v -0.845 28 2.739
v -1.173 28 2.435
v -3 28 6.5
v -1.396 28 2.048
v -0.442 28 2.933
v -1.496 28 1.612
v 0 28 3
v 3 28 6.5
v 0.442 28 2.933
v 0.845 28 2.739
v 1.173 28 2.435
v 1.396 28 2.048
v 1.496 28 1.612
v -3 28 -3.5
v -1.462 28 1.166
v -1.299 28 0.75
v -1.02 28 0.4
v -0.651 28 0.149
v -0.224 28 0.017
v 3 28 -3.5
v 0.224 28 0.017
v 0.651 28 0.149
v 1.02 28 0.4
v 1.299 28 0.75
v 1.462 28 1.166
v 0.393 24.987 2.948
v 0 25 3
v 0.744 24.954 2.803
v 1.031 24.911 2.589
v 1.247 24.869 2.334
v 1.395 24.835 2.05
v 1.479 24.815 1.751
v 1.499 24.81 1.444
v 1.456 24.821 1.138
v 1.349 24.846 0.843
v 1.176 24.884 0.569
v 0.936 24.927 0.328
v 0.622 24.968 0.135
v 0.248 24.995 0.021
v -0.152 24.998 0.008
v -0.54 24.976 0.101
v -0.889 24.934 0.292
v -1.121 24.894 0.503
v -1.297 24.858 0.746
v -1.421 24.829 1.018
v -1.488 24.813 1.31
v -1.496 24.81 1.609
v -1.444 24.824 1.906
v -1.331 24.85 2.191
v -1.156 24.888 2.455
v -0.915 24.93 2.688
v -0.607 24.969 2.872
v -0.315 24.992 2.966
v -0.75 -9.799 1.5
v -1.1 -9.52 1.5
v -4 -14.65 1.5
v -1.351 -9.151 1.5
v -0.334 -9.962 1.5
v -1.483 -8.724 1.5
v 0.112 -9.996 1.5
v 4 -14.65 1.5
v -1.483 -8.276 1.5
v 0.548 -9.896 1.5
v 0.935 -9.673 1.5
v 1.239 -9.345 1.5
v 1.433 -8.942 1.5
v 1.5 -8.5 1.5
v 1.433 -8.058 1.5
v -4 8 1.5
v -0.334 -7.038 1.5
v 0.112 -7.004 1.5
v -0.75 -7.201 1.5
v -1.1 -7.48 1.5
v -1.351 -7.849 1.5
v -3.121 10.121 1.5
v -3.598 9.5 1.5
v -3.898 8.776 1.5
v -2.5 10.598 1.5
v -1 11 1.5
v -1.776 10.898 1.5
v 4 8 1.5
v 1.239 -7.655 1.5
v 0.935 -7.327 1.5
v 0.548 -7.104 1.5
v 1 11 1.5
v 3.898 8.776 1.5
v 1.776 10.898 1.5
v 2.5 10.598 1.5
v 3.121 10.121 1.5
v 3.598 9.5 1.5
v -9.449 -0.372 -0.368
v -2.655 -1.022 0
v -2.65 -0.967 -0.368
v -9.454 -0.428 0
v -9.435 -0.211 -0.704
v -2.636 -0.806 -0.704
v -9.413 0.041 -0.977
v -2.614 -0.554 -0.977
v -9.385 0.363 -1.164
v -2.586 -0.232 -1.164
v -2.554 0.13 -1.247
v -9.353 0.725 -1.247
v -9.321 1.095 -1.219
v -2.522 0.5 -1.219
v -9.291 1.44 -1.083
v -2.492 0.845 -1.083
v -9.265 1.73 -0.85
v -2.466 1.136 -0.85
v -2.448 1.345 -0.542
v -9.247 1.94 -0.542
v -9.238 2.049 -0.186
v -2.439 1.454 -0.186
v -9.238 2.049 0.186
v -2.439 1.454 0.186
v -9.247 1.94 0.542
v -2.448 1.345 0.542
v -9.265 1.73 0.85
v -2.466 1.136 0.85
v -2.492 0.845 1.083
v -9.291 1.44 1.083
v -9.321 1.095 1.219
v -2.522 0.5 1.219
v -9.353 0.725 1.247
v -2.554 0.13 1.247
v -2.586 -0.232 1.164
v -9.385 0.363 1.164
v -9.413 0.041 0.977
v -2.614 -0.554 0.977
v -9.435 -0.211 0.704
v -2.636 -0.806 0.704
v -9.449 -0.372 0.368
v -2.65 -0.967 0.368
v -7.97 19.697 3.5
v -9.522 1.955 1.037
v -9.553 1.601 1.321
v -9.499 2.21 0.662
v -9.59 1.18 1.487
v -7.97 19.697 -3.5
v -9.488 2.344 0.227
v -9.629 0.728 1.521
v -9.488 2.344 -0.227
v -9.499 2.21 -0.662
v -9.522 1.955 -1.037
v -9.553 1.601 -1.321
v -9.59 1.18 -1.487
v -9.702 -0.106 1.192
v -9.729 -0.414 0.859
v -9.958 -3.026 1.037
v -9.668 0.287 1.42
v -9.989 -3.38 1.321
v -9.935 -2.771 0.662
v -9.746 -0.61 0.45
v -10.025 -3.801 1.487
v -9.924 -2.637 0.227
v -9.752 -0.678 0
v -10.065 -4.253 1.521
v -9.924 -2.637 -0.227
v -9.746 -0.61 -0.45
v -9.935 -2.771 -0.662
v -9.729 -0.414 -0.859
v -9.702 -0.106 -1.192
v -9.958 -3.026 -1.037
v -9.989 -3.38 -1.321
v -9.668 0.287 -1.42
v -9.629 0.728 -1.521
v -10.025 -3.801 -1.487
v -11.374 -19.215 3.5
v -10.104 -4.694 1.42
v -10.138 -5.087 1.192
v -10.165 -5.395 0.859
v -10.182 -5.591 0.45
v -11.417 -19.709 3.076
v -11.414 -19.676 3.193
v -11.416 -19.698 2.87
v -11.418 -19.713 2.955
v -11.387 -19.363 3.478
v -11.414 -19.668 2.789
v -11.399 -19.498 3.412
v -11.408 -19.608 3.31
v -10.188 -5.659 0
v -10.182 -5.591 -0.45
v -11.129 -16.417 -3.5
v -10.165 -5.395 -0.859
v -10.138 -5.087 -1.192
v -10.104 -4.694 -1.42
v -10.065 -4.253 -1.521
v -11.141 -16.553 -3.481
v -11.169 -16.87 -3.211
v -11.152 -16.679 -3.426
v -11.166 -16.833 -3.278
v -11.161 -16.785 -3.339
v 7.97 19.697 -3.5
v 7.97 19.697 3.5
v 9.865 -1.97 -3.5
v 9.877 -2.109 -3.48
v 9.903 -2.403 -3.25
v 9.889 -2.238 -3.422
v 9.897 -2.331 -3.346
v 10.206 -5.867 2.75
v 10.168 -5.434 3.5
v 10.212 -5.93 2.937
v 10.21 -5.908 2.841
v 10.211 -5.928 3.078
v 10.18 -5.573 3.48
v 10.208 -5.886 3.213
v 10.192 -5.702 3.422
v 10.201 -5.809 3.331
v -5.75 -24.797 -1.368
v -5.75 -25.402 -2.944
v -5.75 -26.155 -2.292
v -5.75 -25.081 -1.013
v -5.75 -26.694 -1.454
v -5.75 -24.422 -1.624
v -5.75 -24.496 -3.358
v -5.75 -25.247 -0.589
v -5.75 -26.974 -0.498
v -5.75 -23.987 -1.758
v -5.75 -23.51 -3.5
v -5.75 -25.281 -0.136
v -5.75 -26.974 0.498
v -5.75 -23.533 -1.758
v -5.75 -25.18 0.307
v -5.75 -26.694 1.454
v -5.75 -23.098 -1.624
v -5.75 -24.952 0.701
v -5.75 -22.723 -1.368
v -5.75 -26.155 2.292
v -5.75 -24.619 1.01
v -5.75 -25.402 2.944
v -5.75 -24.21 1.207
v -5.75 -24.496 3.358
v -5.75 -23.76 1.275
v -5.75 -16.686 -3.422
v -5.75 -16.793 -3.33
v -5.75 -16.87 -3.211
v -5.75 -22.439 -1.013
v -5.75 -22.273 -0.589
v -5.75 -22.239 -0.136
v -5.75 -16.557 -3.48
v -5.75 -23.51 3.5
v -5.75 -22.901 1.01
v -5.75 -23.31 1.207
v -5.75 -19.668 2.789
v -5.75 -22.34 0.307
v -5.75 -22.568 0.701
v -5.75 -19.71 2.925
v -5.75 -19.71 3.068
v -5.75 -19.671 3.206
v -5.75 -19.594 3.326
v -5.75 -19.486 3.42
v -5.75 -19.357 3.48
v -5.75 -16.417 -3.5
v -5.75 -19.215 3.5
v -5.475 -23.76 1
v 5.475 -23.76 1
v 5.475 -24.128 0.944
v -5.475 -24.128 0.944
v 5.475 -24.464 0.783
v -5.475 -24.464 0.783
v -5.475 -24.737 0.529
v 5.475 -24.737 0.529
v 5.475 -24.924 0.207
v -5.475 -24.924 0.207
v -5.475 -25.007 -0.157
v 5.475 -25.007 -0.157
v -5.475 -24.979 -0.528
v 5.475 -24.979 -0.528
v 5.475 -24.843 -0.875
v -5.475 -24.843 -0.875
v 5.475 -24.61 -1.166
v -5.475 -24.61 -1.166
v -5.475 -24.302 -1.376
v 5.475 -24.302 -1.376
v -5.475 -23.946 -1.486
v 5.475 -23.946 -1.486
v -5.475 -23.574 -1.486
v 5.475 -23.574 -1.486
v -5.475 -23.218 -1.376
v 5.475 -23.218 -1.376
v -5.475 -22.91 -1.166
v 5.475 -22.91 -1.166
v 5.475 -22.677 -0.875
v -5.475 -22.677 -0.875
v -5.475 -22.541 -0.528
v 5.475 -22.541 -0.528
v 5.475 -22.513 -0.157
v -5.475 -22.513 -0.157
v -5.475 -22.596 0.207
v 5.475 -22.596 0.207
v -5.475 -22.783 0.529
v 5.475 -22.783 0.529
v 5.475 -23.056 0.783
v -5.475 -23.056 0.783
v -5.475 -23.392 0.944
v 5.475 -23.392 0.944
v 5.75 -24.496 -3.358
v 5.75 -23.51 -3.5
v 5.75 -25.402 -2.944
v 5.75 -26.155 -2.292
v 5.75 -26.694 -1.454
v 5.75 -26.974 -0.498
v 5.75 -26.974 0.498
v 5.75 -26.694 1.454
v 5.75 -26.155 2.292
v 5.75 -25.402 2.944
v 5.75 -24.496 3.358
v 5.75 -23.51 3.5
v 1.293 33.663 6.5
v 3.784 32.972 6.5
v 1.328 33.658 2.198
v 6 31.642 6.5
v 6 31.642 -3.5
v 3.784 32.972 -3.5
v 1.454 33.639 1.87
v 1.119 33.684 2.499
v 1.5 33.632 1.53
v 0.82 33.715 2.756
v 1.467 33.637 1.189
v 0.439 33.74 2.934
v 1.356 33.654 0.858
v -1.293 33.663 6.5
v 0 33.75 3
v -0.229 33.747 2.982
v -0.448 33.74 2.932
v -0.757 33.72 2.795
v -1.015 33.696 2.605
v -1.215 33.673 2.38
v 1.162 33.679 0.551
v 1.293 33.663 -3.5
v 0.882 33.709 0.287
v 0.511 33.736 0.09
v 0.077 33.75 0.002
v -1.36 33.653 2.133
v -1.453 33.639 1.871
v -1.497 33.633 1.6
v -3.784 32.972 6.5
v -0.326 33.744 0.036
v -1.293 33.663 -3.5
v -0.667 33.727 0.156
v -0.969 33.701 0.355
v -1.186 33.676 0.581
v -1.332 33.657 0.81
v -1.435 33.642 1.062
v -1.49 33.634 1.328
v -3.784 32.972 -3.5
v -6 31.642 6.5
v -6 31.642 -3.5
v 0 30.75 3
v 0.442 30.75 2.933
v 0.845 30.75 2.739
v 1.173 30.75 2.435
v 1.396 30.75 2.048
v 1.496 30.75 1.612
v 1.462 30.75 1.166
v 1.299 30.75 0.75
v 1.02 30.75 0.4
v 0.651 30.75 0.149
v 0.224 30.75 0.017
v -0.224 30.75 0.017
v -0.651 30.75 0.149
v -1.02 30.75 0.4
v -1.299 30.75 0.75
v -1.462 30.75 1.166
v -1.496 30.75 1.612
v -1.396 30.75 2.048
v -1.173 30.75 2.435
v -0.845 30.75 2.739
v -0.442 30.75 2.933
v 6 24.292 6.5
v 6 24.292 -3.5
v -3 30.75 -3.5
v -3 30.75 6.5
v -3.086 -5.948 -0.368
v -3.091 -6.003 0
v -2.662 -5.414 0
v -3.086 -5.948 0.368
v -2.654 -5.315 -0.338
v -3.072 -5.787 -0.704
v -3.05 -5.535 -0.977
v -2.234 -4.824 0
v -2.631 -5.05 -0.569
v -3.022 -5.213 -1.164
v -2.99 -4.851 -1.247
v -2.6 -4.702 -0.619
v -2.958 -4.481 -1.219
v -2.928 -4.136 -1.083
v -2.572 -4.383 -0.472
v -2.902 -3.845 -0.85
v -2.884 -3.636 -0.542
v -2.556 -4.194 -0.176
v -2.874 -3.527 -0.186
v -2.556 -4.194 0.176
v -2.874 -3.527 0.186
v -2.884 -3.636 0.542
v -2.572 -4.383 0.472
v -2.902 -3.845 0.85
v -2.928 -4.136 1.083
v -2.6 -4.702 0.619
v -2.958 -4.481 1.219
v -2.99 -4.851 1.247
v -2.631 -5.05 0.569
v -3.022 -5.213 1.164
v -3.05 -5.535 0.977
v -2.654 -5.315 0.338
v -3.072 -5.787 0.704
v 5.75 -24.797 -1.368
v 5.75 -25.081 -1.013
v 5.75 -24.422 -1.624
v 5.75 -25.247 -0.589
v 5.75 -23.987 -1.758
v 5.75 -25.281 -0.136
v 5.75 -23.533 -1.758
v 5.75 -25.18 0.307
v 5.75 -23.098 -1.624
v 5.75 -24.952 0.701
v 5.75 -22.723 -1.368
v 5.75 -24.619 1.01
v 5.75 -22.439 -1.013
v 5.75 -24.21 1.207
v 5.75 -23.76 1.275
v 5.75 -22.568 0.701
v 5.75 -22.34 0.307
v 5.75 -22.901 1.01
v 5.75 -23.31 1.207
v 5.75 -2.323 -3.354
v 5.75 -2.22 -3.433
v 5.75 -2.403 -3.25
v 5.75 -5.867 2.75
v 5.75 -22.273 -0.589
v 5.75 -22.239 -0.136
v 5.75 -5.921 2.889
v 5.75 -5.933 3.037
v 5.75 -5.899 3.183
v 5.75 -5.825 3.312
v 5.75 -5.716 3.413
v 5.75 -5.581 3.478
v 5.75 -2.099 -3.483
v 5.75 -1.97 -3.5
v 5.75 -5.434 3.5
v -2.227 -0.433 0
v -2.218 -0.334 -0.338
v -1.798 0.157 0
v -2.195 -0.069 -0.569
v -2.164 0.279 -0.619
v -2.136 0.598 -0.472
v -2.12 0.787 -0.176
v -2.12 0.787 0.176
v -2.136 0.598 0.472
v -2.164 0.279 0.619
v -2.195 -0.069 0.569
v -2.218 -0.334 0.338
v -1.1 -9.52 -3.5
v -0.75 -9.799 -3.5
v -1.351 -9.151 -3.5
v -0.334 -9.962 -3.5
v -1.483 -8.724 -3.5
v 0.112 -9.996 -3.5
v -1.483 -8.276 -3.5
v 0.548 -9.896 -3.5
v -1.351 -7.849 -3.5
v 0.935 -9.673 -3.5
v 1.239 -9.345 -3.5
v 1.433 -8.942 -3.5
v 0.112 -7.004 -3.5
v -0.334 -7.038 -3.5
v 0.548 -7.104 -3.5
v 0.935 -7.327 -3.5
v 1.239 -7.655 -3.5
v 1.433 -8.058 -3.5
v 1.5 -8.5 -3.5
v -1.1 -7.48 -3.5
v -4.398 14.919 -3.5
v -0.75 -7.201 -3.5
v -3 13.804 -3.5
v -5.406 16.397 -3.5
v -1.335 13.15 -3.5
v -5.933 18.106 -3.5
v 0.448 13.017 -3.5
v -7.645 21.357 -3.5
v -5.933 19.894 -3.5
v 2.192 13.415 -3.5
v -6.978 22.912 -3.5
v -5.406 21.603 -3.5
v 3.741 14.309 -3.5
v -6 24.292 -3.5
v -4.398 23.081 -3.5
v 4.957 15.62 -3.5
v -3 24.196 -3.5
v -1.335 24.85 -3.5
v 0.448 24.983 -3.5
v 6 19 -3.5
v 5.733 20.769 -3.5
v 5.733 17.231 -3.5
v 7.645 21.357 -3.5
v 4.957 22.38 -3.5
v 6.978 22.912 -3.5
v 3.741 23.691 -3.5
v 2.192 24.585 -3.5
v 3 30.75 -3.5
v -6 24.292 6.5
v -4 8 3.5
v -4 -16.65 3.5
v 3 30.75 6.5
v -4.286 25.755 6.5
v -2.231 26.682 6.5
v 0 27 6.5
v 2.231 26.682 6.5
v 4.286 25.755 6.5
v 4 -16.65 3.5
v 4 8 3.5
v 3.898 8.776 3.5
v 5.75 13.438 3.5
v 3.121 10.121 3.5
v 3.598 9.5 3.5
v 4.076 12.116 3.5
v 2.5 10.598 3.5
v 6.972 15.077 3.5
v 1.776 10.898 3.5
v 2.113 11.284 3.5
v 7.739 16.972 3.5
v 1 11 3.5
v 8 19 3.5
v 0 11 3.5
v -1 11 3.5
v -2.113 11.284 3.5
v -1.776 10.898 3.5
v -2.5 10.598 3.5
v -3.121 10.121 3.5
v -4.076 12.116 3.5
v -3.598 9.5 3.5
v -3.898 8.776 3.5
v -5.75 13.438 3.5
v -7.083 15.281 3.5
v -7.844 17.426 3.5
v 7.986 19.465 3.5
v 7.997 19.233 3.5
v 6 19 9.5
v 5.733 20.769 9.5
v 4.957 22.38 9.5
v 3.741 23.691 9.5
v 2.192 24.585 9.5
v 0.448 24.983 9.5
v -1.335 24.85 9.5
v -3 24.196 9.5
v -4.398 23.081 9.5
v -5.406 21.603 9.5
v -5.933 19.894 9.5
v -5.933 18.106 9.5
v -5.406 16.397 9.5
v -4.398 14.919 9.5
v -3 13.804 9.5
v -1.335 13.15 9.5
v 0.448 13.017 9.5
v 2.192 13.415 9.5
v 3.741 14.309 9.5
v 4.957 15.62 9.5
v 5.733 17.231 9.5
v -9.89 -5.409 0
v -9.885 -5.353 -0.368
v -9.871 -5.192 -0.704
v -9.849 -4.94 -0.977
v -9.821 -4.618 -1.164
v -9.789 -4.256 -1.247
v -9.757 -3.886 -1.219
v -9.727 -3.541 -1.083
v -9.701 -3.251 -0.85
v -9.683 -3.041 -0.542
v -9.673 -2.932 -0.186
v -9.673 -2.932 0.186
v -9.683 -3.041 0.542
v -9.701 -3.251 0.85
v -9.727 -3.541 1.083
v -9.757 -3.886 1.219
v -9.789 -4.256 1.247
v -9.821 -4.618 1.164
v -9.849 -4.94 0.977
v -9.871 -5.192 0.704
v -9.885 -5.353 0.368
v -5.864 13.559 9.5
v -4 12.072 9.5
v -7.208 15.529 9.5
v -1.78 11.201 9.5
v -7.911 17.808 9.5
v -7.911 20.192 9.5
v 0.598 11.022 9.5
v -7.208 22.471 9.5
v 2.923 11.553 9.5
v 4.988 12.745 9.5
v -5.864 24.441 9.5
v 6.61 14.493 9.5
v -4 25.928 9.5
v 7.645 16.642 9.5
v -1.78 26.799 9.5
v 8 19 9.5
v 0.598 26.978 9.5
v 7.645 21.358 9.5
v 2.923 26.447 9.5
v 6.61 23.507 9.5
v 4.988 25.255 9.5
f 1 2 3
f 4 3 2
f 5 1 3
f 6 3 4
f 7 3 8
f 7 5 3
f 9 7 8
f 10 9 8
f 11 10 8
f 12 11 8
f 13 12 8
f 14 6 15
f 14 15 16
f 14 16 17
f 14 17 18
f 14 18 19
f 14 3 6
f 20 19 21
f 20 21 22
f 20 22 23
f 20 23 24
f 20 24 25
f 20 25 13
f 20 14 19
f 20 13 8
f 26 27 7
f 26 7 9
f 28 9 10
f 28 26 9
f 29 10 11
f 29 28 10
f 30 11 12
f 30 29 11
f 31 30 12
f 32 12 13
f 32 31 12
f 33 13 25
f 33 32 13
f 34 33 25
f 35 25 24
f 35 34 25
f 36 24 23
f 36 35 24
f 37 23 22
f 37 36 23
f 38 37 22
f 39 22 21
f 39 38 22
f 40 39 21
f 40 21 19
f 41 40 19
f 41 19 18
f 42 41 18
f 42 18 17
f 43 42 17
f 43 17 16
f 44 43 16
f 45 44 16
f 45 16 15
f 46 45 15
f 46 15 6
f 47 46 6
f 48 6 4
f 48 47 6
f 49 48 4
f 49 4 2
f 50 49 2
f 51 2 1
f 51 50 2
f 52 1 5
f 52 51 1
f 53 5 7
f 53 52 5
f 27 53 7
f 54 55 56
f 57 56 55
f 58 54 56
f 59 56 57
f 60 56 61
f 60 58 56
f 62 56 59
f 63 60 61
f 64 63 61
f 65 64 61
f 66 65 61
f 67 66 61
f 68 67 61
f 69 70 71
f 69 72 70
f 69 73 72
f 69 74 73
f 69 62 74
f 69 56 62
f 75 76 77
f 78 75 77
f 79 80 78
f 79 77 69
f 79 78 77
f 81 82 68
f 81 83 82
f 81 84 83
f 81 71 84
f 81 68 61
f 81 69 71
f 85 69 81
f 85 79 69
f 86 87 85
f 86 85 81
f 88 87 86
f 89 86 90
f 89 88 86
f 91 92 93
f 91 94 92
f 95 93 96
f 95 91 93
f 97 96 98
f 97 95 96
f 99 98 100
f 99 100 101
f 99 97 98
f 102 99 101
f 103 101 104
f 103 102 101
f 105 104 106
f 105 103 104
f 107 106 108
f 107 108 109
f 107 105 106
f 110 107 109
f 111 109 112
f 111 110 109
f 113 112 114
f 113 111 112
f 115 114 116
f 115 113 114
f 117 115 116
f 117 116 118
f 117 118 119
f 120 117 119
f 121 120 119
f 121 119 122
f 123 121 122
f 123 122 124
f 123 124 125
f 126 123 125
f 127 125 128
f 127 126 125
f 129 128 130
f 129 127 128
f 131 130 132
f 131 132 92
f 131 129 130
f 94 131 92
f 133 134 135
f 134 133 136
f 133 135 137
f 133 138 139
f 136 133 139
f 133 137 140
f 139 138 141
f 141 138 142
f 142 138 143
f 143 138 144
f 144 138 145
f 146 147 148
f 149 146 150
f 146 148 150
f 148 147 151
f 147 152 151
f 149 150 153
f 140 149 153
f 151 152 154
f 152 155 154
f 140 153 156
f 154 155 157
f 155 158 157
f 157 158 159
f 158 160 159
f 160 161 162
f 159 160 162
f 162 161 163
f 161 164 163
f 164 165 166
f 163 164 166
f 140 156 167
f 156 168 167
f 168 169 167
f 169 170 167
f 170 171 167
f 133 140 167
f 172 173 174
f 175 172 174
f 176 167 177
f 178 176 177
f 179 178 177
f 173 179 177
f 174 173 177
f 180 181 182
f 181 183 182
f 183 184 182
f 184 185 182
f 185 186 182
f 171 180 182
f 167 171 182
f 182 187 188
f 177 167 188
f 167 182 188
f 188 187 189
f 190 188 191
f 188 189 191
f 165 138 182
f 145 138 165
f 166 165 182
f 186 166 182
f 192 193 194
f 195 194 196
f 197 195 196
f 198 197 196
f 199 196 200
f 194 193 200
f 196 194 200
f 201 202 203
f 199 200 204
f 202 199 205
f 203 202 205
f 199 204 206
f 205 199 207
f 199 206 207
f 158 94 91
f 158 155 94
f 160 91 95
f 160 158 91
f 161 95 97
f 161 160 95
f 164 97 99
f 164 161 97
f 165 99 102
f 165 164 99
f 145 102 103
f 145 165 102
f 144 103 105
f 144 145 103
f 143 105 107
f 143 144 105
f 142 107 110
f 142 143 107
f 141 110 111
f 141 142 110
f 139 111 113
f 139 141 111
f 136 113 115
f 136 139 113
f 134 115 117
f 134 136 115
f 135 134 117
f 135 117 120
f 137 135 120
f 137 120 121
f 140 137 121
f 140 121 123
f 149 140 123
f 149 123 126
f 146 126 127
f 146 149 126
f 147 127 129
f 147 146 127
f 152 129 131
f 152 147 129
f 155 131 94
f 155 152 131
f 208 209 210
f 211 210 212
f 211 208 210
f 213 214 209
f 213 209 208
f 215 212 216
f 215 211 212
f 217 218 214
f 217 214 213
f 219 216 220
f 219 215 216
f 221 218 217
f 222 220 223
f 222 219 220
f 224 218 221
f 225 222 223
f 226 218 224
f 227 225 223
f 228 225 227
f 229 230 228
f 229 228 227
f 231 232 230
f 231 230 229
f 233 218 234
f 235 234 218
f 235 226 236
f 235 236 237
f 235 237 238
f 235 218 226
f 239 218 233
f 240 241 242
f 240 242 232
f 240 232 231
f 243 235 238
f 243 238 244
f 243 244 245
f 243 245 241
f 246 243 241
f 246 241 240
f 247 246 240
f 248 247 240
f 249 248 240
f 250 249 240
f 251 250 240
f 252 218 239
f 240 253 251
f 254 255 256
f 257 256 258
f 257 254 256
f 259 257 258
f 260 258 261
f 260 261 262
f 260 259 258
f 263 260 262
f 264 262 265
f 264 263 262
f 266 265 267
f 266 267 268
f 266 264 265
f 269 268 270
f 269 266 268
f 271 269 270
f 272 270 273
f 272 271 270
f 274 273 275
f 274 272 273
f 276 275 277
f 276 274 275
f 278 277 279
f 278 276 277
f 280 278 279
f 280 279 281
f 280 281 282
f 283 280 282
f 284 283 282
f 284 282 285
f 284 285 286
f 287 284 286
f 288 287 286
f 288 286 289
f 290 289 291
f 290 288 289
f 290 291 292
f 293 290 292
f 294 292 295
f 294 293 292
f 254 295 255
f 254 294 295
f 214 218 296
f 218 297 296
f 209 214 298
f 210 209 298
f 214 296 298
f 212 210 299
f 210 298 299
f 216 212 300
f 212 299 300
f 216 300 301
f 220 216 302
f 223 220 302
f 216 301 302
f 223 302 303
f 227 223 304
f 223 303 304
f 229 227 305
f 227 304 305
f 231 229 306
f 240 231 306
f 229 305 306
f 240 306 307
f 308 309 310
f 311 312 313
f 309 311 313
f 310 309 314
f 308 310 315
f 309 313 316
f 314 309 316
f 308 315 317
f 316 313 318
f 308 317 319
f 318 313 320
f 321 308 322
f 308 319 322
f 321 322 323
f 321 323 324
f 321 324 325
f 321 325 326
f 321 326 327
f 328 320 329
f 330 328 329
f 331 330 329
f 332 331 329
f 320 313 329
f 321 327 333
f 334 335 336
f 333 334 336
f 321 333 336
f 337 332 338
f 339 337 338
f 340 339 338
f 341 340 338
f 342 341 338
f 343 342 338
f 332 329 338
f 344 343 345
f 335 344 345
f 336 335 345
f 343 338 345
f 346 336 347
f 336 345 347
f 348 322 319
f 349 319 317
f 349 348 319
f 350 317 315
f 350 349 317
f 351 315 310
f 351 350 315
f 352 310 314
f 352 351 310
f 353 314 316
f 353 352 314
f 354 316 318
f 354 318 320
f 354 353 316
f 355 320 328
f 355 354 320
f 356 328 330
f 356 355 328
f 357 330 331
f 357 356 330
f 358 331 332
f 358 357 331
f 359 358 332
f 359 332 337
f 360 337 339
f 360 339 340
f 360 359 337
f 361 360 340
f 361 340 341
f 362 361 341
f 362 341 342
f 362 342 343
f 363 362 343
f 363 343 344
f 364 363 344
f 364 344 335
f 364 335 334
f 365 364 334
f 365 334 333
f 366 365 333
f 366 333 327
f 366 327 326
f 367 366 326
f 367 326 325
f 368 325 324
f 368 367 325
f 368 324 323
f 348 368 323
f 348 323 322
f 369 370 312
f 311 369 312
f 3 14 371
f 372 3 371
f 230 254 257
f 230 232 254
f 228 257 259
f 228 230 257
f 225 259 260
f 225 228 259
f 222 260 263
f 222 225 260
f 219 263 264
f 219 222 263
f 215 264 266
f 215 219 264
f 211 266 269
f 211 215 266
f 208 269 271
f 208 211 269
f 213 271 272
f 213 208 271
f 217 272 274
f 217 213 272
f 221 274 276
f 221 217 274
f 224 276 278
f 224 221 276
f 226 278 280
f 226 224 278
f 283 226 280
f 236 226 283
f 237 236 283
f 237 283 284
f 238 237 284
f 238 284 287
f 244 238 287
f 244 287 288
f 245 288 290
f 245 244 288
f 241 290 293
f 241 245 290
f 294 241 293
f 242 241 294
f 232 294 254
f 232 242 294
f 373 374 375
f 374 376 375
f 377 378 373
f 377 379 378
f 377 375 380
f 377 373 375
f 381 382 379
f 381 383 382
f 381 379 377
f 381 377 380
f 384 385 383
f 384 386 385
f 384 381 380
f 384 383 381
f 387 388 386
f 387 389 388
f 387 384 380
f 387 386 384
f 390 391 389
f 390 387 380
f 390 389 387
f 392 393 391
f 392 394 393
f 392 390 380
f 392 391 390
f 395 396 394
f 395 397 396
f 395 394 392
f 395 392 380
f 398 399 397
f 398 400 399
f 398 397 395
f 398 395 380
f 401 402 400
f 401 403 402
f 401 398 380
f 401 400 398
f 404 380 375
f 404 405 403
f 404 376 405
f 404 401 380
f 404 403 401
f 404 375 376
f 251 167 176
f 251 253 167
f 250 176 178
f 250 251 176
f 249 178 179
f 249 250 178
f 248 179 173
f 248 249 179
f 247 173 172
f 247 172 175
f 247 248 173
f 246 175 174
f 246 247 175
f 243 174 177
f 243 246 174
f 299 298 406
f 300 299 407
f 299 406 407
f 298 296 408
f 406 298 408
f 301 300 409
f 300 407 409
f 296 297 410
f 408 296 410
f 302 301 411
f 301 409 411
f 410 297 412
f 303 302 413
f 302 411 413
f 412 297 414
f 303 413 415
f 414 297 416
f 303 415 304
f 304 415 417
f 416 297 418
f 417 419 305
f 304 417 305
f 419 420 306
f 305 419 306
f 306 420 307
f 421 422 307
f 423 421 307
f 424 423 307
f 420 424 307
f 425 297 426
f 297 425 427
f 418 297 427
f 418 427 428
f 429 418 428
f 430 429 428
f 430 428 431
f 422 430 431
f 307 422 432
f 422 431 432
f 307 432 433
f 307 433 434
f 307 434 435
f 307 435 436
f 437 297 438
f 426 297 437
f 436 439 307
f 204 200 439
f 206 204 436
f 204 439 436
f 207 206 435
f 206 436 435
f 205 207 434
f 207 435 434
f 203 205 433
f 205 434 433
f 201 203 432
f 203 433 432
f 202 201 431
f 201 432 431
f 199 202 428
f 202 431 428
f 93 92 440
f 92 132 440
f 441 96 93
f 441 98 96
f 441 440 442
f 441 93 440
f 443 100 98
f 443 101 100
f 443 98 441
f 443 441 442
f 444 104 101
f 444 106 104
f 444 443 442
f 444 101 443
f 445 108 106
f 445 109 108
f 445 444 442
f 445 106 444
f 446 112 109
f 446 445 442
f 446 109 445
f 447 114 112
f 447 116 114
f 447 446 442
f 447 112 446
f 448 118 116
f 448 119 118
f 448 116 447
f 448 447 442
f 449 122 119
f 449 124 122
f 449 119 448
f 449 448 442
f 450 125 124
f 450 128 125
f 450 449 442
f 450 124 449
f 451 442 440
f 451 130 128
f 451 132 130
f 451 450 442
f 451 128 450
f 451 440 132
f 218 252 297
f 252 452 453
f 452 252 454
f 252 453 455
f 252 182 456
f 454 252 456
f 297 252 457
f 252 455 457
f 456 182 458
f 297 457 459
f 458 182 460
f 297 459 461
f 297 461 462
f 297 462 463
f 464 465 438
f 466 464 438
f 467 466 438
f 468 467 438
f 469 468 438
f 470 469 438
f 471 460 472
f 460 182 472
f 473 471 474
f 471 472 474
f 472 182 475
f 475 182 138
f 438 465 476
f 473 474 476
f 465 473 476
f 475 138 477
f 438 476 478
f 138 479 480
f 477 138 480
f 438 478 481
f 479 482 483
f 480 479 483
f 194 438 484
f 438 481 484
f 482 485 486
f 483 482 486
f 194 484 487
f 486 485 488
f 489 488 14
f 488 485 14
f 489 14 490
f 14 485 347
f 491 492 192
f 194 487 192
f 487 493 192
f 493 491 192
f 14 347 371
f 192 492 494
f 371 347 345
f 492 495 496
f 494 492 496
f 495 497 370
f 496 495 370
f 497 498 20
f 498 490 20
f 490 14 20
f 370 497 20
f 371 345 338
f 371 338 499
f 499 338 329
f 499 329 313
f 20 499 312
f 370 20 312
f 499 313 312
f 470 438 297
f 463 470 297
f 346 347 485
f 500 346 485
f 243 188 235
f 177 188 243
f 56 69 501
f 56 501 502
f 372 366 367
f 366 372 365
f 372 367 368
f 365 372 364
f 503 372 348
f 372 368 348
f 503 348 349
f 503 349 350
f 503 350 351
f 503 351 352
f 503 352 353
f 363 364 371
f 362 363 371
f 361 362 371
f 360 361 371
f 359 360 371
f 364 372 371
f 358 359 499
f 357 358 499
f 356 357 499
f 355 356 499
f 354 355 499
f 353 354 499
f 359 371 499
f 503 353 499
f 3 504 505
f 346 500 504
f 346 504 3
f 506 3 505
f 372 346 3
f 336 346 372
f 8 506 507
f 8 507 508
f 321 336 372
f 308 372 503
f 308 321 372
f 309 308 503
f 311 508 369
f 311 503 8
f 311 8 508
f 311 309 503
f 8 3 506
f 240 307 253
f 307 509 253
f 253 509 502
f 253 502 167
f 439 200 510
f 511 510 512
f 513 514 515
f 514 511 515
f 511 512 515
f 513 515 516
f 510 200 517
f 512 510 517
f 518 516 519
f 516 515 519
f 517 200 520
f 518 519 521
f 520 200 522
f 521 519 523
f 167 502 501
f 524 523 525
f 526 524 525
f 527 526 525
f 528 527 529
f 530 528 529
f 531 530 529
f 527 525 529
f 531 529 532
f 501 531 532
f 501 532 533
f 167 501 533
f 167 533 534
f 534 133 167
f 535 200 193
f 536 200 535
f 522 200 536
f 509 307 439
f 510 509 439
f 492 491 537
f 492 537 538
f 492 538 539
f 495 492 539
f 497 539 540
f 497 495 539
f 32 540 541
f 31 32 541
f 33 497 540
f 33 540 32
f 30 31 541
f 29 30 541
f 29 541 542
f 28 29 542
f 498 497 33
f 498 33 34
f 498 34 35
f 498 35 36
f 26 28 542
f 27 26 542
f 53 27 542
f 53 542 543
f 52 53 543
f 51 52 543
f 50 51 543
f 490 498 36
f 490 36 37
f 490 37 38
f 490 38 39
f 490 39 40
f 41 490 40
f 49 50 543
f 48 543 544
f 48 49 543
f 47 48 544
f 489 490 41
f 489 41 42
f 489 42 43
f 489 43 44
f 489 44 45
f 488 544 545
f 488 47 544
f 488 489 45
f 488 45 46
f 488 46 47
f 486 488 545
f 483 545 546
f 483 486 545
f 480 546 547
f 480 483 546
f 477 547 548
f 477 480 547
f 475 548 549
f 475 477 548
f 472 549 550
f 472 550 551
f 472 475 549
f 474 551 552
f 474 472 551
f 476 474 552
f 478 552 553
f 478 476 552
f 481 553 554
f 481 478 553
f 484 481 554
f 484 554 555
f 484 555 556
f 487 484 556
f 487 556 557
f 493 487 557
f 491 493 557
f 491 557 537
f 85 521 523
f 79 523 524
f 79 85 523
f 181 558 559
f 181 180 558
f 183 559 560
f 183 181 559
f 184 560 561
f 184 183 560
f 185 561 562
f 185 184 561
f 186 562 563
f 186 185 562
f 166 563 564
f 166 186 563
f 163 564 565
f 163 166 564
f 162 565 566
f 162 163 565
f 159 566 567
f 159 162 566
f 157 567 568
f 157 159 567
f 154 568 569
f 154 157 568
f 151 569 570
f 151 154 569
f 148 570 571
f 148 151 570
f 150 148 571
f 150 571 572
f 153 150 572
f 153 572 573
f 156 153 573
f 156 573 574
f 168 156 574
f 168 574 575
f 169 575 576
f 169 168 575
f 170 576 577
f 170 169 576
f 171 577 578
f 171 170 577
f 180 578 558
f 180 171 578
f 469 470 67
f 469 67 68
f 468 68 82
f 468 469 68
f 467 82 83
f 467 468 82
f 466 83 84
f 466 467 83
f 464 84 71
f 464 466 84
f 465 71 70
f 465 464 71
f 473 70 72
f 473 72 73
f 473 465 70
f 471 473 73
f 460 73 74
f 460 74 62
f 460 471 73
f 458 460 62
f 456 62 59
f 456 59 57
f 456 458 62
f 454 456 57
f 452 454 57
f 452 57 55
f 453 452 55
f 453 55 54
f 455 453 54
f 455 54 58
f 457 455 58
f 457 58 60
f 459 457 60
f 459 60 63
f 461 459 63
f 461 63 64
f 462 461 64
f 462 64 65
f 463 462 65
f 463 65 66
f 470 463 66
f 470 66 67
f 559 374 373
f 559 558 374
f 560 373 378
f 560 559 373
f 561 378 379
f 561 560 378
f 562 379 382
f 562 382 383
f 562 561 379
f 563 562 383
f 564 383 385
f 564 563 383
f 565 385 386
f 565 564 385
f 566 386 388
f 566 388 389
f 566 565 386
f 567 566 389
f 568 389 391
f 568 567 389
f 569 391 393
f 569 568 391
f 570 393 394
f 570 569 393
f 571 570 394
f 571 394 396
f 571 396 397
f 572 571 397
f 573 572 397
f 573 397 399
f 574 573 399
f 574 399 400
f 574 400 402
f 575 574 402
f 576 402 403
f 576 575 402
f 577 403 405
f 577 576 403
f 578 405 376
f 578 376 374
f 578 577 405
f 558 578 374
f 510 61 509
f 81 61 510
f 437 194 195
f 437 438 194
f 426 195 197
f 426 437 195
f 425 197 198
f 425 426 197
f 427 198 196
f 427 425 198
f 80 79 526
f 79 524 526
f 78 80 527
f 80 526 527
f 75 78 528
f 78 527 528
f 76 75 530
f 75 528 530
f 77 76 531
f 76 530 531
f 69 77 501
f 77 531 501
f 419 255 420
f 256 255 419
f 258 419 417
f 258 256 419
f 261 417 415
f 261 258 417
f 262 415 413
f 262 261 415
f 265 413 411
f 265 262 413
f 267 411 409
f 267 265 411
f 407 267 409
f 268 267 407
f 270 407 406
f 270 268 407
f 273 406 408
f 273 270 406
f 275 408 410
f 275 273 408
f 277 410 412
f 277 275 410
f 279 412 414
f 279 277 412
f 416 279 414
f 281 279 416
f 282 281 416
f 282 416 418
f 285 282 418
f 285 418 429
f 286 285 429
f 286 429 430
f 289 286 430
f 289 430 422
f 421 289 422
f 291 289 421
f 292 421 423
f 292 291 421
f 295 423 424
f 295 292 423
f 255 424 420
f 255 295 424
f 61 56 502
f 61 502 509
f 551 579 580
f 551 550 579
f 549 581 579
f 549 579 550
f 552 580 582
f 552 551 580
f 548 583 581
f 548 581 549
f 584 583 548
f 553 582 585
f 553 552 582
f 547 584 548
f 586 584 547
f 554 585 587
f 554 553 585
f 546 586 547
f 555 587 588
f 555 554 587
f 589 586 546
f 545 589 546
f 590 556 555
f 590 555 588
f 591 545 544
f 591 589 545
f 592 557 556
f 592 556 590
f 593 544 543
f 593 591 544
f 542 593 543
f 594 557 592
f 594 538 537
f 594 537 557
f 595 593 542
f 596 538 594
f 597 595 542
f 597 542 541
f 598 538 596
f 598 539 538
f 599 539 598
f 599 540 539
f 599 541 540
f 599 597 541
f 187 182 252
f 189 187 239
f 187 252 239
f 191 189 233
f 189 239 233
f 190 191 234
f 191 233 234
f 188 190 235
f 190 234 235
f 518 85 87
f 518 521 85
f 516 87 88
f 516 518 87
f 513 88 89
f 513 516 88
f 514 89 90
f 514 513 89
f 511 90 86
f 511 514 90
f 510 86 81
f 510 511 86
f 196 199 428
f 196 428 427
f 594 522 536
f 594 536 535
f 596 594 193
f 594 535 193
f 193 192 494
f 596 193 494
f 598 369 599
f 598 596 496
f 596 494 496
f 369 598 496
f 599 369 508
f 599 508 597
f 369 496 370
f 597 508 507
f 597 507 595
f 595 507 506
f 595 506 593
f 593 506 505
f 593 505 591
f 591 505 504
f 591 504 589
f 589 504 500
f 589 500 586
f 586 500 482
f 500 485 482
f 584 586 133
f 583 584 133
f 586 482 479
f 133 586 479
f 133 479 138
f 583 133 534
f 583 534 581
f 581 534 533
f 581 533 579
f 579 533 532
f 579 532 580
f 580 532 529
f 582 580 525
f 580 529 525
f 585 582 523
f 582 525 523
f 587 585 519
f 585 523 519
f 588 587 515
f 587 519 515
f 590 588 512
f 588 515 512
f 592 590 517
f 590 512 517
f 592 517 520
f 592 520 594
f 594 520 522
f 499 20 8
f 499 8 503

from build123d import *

# Parameters (mm, degrees)
SKETCH1_R                = 1
BOSS_EXTRUDE1_DEPTH      = 5.75
BOSS_EXTRUDE2_DEPTH      = 6.5
BOSS_EXTRUDE2_DEPTH_BACK = 3.5
SKETCH3_W                = 6
SKETCH3_H                = 2.75
BOSS_EXTRUDE3_DEPTH      = 9.5
BOSS_EXTRUDE3_DEPTH_BACK = 3.5
SKETCH3_5_R              = 8
SKETCH3_5_R_2            = 6
CUT_EXTRUDE1_DEPTH       = 36.96265424
CUT_EXTRUDE1_DEPTH_BACK  = 36.96265424
SKETCH3_6_R              = 6
SKETCH3_6_R_2            = 1.5
CUT_EXTRUDE3_START       = 1.5
SKETCH3_8_R              = 1.5
CUT_EXTRUDE3_DEPTH       = 2
FILLET1_R                = 3
CHAMFER1_SIZE            = 2
BOSS_EXTRUDE4_DEPTH      = 3.5
CUT_EXTRUDE5_DEPTH       = 4.494021888
CUT_EXTRUDE6_DEPTH       = 5.692616578
FILLET2_R                = 0.5
CUT_EXTRUDE8_DEPTH       = 57.979942817
CUT_EXTRUDE8_DEPTH_BACK  = 10
SKETCH11_R               = 1.5
LPATTERN1_COUNT          = 2
LPATTERN1_PITCH          = 5
SKETCH14_R               = 1
BOSS_EXTRUDE5_DEPTH      = 11.5


with BuildPart() as part:
    # Sketch1 → Boss-Extrude1 (new, symmetric)
    with BuildSketch(Plane(origin=(0, 0, 0), x_dir=(0, 0, -1), z_dir=(1, 0, 0))):
        with BuildLine():
            Line((-3.5, 19), (3.5, 19))
            Line((3.5, 19), (3.5, -23.51))
            ThreePointArc((3.5, -23.51), (0, -27.01), (-3.5, -23.51))
            Line((-3.5, -23.51), (-3.5, 19))
        make_face()
        with Locations((0.25, -23.76)):
            Circle(SKETCH1_R, mode=Mode.SUBTRACT)
    extrude(amount=BOSS_EXTRUDE1_DEPTH, both=True)



with BuildPart() as body_2:
    # Sketch3 → Boss-Extrude2 (new, two sides: drawn at the far end of the back side and taken through both)
    with BuildSketch(Plane.XY.offset(-BOSS_EXTRUDE2_DEPTH_BACK)):
        with BuildLine():
            ThreePointArc((-6, 24.291502622), (0, 27), (6, 24.291502622))
            Line((6, 24.291502622), (6, 31.641502622))
            ThreePointArc((6, 31.641502622), (0, 33.75), (-6, 31.641502622))
            Line((-6, 31.641502622), (-6, 24.291502622))
        make_face()
        with Locations((0, 29.375)):
            Rectangle(SKETCH3_W, SKETCH3_H, mode=Mode.SUBTRACT)
    extrude(amount=BOSS_EXTRUDE2_DEPTH + BOSS_EXTRUDE2_DEPTH_BACK)


with BuildPart() as part_1:
    add(part.part)

    add(body_2.part)  # Boss-Extrude3 merges body 2
    # Sketch3<5> → Boss-Extrude3 (add, two sides: drawn at the far end of the back side and taken through both)
    with BuildSketch(Plane.XY.offset(-BOSS_EXTRUDE3_DEPTH_BACK)):
        with Locations((0, 19)):
            Circle(SKETCH3_5_R)
        with Locations((0, 19)):
            Circle(SKETCH3_5_R_2, mode=Mode.SUBTRACT)
    extrude(amount=BOSS_EXTRUDE3_DEPTH + BOSS_EXTRUDE3_DEPTH_BACK)

    # Sketch3<6> → Cut-Extrude1 (cut, two sides: drawn at the far end of the back side and taken through both)
    with BuildSketch(Plane.XY.offset(-CUT_EXTRUDE1_DEPTH_BACK)):
        with Locations((0, 19)):
            Circle(SKETCH3_6_R)
        with Locations((0, -8.5)):
            Circle(SKETCH3_6_R_2)
    extrude(amount=CUT_EXTRUDE1_DEPTH + CUT_EXTRUDE1_DEPTH_BACK, mode=Mode.SUBTRACT)

    # Sketch3<8> → Cut-Extrude3 (cut)
    with BuildSketch(Plane.XY.offset(CUT_EXTRUDE3_START)):
        Polygon((4, -14.65), (4, 11), (0, 11), (-4, 11), (-4, -14.65), align=None)
        with Locations((0, -8.5)):
            Circle(SKETCH3_8_R, mode=Mode.SUBTRACT)
    extrude(amount=CUT_EXTRUDE3_DEPTH, mode=Mode.SUBTRACT)

    # Fillet1
    fillet1_edges = [part_1.edges().sort_by_distance(p)[0] for p in [
        (4, 11, 2.5),
        (-4, 11, 2.5),
    ]]
    fillet(fillet1_edges, radius=FILLET1_R)

    # Chamfer1
    chamfer1_edges = [part_1.edges().sort_by_distance(p)[0] for p in [
        (0, -14.65, 3.5),
    ]]
    chamfer(chamfer1_edges, length=CHAMFER1_SIZE - 0.0001)  # a hair under: the kernel refuses the full size

    # Sketch6 → Boss-Extrude4 (add, symmetric)
    with BuildSketch(Plane.XY):
        with BuildLine():
            Line((-5.75, -20), (-5.75, 13.437851135))
            ThreePointArc((-5.75, 13.437851135), (-7.539998072, 16.32634537), (-7.969557585, 19.697245942))
            Line((-7.969557585, 19.697245942), (-11.442616578, -20))
            Line((-11.442616578, -20), (-5.75, -20))
        make_face()
        with BuildLine():
            ThreePointArc((5.75, 13.437851135), (7.539998072, 16.32634537), (7.969557585, 19.697245942))
            Line((7.969557585, 19.697245942), (10.244021888, -6.3))
            Line((10.244021888, -6.3), (5.75, -6.3))
            Line((5.75, -6.3), (5.75, 13.437851135))
        make_face()
    extrude(amount=BOSS_EXTRUDE4_DEPTH, both=True)

    # Sketch8 → Cut-Extrude5 (cut)
    with BuildSketch(Plane(origin=(10.244021888, 0, 0), x_dir=(0, 0, -1), z_dir=(1, 0, 0))):
        Polygon((-3.5, -6.3), (3.5, -2.258548116), (3.5, -6.3), align=None)
    extrude(amount=-CUT_EXTRUDE5_DEPTH, mode=Mode.SUBTRACT)

    # Sketch9 → Cut-Extrude6 (cut)
    with BuildSketch(Plane.ZY.offset(11.442616578)):
        Polygon((-3.5, -20), (-3.5, -16.735846393), (3.5, -20), align=None)
    extrude(amount=-CUT_EXTRUDE6_DEPTH, mode=Mode.SUBTRACT)

    # Fillet2
    fillet2_edges = [part_1.edges().sort_by_distance(p)[0] for p in [
        (-8.596308289, -20, 3.5),
        (7.997010944, -6.3, 3.5),
        (7.820220332, -2.258548116, -3.5),
        (-8.453520071, -16.735846393, -3.5),
    ]]
    fillet(fillet2_edges, radius=FILLET2_R)

    # Sketch11 → Cut-Extrude8 (cut, two sides: drawn at the far end of the back side and taken through both)
    with BuildSketch(Plane(origin=(0, 28, 0), x_dir=(1, 0, 0), z_dir=(0, 1, 0)).offset(-CUT_EXTRUDE8_DEPTH_BACK)):
        with Locations(Location((0, -1.5, 0), (0, 0, 270))):
            Circle(SKETCH11_R)
    extrude(amount=CUT_EXTRUDE8_DEPTH + CUT_EXTRUDE8_DEPTH_BACK, mode=Mode.SUBTRACT)

    # Sketch13 → M3 Tapped Hole1 (revolve, cut)
    with BuildSketch(Plane(origin=(-9.619215273, 0.841572288, 0), x_dir=(-0.08715574274765137, -0.9961946980917462, 0), z_dir=(0, 0, 1))):
        Polygon((0, 0), (0, 7.851075774), (1.25, 7.1), (1.25, 0.275), (1.525, 0), align=None)
    m3_tapped_hole1 = revolve(axis=Axis((-15.945051605, 1.395011255, 0), (0.996194698091746, -0.08715574274765134, 0)), mode=Mode.SUBTRACT)

    # LPattern1: M3 Tapped Hole1 ×2
    with Locations(*[Vector(-0.08715574274765112, -0.9961946980917462, 0) * (i * LPATTERN1_PITCH) for i in range(1, LPATTERN1_COUNT)]):
        add(m3_tapped_hole1, mode=Mode.SUBTRACT)

    # Sketch14 → Boss-Extrude5 (add)
    with BuildSketch(Plane.ZY.offset(5.75)):
        with Locations((-0.25, -23.76)):
            Circle(SKETCH14_R)
    extrude(amount=-BOSS_EXTRUDE5_DEPTH)

    # Sketch16 → M3 Tapped Hole2 (revolve, cut)
    with BuildSketch(Plane(origin=(-5.75, -23.76, -0.25), x_dir=(0, 0, 1), z_dir=(0, 1, 0))):
        Polygon((0, 0), (0, 11.5), (1.525, 11.5), (1.25, 11.225), (1.25, 0.275), (1.525, 0), align=None)
    revolve(axis=Axis((-12.1, -23.76, -0.25), (1, 0, 0)), mode=Mode.SUBTRACT)


solid = part_1.part
